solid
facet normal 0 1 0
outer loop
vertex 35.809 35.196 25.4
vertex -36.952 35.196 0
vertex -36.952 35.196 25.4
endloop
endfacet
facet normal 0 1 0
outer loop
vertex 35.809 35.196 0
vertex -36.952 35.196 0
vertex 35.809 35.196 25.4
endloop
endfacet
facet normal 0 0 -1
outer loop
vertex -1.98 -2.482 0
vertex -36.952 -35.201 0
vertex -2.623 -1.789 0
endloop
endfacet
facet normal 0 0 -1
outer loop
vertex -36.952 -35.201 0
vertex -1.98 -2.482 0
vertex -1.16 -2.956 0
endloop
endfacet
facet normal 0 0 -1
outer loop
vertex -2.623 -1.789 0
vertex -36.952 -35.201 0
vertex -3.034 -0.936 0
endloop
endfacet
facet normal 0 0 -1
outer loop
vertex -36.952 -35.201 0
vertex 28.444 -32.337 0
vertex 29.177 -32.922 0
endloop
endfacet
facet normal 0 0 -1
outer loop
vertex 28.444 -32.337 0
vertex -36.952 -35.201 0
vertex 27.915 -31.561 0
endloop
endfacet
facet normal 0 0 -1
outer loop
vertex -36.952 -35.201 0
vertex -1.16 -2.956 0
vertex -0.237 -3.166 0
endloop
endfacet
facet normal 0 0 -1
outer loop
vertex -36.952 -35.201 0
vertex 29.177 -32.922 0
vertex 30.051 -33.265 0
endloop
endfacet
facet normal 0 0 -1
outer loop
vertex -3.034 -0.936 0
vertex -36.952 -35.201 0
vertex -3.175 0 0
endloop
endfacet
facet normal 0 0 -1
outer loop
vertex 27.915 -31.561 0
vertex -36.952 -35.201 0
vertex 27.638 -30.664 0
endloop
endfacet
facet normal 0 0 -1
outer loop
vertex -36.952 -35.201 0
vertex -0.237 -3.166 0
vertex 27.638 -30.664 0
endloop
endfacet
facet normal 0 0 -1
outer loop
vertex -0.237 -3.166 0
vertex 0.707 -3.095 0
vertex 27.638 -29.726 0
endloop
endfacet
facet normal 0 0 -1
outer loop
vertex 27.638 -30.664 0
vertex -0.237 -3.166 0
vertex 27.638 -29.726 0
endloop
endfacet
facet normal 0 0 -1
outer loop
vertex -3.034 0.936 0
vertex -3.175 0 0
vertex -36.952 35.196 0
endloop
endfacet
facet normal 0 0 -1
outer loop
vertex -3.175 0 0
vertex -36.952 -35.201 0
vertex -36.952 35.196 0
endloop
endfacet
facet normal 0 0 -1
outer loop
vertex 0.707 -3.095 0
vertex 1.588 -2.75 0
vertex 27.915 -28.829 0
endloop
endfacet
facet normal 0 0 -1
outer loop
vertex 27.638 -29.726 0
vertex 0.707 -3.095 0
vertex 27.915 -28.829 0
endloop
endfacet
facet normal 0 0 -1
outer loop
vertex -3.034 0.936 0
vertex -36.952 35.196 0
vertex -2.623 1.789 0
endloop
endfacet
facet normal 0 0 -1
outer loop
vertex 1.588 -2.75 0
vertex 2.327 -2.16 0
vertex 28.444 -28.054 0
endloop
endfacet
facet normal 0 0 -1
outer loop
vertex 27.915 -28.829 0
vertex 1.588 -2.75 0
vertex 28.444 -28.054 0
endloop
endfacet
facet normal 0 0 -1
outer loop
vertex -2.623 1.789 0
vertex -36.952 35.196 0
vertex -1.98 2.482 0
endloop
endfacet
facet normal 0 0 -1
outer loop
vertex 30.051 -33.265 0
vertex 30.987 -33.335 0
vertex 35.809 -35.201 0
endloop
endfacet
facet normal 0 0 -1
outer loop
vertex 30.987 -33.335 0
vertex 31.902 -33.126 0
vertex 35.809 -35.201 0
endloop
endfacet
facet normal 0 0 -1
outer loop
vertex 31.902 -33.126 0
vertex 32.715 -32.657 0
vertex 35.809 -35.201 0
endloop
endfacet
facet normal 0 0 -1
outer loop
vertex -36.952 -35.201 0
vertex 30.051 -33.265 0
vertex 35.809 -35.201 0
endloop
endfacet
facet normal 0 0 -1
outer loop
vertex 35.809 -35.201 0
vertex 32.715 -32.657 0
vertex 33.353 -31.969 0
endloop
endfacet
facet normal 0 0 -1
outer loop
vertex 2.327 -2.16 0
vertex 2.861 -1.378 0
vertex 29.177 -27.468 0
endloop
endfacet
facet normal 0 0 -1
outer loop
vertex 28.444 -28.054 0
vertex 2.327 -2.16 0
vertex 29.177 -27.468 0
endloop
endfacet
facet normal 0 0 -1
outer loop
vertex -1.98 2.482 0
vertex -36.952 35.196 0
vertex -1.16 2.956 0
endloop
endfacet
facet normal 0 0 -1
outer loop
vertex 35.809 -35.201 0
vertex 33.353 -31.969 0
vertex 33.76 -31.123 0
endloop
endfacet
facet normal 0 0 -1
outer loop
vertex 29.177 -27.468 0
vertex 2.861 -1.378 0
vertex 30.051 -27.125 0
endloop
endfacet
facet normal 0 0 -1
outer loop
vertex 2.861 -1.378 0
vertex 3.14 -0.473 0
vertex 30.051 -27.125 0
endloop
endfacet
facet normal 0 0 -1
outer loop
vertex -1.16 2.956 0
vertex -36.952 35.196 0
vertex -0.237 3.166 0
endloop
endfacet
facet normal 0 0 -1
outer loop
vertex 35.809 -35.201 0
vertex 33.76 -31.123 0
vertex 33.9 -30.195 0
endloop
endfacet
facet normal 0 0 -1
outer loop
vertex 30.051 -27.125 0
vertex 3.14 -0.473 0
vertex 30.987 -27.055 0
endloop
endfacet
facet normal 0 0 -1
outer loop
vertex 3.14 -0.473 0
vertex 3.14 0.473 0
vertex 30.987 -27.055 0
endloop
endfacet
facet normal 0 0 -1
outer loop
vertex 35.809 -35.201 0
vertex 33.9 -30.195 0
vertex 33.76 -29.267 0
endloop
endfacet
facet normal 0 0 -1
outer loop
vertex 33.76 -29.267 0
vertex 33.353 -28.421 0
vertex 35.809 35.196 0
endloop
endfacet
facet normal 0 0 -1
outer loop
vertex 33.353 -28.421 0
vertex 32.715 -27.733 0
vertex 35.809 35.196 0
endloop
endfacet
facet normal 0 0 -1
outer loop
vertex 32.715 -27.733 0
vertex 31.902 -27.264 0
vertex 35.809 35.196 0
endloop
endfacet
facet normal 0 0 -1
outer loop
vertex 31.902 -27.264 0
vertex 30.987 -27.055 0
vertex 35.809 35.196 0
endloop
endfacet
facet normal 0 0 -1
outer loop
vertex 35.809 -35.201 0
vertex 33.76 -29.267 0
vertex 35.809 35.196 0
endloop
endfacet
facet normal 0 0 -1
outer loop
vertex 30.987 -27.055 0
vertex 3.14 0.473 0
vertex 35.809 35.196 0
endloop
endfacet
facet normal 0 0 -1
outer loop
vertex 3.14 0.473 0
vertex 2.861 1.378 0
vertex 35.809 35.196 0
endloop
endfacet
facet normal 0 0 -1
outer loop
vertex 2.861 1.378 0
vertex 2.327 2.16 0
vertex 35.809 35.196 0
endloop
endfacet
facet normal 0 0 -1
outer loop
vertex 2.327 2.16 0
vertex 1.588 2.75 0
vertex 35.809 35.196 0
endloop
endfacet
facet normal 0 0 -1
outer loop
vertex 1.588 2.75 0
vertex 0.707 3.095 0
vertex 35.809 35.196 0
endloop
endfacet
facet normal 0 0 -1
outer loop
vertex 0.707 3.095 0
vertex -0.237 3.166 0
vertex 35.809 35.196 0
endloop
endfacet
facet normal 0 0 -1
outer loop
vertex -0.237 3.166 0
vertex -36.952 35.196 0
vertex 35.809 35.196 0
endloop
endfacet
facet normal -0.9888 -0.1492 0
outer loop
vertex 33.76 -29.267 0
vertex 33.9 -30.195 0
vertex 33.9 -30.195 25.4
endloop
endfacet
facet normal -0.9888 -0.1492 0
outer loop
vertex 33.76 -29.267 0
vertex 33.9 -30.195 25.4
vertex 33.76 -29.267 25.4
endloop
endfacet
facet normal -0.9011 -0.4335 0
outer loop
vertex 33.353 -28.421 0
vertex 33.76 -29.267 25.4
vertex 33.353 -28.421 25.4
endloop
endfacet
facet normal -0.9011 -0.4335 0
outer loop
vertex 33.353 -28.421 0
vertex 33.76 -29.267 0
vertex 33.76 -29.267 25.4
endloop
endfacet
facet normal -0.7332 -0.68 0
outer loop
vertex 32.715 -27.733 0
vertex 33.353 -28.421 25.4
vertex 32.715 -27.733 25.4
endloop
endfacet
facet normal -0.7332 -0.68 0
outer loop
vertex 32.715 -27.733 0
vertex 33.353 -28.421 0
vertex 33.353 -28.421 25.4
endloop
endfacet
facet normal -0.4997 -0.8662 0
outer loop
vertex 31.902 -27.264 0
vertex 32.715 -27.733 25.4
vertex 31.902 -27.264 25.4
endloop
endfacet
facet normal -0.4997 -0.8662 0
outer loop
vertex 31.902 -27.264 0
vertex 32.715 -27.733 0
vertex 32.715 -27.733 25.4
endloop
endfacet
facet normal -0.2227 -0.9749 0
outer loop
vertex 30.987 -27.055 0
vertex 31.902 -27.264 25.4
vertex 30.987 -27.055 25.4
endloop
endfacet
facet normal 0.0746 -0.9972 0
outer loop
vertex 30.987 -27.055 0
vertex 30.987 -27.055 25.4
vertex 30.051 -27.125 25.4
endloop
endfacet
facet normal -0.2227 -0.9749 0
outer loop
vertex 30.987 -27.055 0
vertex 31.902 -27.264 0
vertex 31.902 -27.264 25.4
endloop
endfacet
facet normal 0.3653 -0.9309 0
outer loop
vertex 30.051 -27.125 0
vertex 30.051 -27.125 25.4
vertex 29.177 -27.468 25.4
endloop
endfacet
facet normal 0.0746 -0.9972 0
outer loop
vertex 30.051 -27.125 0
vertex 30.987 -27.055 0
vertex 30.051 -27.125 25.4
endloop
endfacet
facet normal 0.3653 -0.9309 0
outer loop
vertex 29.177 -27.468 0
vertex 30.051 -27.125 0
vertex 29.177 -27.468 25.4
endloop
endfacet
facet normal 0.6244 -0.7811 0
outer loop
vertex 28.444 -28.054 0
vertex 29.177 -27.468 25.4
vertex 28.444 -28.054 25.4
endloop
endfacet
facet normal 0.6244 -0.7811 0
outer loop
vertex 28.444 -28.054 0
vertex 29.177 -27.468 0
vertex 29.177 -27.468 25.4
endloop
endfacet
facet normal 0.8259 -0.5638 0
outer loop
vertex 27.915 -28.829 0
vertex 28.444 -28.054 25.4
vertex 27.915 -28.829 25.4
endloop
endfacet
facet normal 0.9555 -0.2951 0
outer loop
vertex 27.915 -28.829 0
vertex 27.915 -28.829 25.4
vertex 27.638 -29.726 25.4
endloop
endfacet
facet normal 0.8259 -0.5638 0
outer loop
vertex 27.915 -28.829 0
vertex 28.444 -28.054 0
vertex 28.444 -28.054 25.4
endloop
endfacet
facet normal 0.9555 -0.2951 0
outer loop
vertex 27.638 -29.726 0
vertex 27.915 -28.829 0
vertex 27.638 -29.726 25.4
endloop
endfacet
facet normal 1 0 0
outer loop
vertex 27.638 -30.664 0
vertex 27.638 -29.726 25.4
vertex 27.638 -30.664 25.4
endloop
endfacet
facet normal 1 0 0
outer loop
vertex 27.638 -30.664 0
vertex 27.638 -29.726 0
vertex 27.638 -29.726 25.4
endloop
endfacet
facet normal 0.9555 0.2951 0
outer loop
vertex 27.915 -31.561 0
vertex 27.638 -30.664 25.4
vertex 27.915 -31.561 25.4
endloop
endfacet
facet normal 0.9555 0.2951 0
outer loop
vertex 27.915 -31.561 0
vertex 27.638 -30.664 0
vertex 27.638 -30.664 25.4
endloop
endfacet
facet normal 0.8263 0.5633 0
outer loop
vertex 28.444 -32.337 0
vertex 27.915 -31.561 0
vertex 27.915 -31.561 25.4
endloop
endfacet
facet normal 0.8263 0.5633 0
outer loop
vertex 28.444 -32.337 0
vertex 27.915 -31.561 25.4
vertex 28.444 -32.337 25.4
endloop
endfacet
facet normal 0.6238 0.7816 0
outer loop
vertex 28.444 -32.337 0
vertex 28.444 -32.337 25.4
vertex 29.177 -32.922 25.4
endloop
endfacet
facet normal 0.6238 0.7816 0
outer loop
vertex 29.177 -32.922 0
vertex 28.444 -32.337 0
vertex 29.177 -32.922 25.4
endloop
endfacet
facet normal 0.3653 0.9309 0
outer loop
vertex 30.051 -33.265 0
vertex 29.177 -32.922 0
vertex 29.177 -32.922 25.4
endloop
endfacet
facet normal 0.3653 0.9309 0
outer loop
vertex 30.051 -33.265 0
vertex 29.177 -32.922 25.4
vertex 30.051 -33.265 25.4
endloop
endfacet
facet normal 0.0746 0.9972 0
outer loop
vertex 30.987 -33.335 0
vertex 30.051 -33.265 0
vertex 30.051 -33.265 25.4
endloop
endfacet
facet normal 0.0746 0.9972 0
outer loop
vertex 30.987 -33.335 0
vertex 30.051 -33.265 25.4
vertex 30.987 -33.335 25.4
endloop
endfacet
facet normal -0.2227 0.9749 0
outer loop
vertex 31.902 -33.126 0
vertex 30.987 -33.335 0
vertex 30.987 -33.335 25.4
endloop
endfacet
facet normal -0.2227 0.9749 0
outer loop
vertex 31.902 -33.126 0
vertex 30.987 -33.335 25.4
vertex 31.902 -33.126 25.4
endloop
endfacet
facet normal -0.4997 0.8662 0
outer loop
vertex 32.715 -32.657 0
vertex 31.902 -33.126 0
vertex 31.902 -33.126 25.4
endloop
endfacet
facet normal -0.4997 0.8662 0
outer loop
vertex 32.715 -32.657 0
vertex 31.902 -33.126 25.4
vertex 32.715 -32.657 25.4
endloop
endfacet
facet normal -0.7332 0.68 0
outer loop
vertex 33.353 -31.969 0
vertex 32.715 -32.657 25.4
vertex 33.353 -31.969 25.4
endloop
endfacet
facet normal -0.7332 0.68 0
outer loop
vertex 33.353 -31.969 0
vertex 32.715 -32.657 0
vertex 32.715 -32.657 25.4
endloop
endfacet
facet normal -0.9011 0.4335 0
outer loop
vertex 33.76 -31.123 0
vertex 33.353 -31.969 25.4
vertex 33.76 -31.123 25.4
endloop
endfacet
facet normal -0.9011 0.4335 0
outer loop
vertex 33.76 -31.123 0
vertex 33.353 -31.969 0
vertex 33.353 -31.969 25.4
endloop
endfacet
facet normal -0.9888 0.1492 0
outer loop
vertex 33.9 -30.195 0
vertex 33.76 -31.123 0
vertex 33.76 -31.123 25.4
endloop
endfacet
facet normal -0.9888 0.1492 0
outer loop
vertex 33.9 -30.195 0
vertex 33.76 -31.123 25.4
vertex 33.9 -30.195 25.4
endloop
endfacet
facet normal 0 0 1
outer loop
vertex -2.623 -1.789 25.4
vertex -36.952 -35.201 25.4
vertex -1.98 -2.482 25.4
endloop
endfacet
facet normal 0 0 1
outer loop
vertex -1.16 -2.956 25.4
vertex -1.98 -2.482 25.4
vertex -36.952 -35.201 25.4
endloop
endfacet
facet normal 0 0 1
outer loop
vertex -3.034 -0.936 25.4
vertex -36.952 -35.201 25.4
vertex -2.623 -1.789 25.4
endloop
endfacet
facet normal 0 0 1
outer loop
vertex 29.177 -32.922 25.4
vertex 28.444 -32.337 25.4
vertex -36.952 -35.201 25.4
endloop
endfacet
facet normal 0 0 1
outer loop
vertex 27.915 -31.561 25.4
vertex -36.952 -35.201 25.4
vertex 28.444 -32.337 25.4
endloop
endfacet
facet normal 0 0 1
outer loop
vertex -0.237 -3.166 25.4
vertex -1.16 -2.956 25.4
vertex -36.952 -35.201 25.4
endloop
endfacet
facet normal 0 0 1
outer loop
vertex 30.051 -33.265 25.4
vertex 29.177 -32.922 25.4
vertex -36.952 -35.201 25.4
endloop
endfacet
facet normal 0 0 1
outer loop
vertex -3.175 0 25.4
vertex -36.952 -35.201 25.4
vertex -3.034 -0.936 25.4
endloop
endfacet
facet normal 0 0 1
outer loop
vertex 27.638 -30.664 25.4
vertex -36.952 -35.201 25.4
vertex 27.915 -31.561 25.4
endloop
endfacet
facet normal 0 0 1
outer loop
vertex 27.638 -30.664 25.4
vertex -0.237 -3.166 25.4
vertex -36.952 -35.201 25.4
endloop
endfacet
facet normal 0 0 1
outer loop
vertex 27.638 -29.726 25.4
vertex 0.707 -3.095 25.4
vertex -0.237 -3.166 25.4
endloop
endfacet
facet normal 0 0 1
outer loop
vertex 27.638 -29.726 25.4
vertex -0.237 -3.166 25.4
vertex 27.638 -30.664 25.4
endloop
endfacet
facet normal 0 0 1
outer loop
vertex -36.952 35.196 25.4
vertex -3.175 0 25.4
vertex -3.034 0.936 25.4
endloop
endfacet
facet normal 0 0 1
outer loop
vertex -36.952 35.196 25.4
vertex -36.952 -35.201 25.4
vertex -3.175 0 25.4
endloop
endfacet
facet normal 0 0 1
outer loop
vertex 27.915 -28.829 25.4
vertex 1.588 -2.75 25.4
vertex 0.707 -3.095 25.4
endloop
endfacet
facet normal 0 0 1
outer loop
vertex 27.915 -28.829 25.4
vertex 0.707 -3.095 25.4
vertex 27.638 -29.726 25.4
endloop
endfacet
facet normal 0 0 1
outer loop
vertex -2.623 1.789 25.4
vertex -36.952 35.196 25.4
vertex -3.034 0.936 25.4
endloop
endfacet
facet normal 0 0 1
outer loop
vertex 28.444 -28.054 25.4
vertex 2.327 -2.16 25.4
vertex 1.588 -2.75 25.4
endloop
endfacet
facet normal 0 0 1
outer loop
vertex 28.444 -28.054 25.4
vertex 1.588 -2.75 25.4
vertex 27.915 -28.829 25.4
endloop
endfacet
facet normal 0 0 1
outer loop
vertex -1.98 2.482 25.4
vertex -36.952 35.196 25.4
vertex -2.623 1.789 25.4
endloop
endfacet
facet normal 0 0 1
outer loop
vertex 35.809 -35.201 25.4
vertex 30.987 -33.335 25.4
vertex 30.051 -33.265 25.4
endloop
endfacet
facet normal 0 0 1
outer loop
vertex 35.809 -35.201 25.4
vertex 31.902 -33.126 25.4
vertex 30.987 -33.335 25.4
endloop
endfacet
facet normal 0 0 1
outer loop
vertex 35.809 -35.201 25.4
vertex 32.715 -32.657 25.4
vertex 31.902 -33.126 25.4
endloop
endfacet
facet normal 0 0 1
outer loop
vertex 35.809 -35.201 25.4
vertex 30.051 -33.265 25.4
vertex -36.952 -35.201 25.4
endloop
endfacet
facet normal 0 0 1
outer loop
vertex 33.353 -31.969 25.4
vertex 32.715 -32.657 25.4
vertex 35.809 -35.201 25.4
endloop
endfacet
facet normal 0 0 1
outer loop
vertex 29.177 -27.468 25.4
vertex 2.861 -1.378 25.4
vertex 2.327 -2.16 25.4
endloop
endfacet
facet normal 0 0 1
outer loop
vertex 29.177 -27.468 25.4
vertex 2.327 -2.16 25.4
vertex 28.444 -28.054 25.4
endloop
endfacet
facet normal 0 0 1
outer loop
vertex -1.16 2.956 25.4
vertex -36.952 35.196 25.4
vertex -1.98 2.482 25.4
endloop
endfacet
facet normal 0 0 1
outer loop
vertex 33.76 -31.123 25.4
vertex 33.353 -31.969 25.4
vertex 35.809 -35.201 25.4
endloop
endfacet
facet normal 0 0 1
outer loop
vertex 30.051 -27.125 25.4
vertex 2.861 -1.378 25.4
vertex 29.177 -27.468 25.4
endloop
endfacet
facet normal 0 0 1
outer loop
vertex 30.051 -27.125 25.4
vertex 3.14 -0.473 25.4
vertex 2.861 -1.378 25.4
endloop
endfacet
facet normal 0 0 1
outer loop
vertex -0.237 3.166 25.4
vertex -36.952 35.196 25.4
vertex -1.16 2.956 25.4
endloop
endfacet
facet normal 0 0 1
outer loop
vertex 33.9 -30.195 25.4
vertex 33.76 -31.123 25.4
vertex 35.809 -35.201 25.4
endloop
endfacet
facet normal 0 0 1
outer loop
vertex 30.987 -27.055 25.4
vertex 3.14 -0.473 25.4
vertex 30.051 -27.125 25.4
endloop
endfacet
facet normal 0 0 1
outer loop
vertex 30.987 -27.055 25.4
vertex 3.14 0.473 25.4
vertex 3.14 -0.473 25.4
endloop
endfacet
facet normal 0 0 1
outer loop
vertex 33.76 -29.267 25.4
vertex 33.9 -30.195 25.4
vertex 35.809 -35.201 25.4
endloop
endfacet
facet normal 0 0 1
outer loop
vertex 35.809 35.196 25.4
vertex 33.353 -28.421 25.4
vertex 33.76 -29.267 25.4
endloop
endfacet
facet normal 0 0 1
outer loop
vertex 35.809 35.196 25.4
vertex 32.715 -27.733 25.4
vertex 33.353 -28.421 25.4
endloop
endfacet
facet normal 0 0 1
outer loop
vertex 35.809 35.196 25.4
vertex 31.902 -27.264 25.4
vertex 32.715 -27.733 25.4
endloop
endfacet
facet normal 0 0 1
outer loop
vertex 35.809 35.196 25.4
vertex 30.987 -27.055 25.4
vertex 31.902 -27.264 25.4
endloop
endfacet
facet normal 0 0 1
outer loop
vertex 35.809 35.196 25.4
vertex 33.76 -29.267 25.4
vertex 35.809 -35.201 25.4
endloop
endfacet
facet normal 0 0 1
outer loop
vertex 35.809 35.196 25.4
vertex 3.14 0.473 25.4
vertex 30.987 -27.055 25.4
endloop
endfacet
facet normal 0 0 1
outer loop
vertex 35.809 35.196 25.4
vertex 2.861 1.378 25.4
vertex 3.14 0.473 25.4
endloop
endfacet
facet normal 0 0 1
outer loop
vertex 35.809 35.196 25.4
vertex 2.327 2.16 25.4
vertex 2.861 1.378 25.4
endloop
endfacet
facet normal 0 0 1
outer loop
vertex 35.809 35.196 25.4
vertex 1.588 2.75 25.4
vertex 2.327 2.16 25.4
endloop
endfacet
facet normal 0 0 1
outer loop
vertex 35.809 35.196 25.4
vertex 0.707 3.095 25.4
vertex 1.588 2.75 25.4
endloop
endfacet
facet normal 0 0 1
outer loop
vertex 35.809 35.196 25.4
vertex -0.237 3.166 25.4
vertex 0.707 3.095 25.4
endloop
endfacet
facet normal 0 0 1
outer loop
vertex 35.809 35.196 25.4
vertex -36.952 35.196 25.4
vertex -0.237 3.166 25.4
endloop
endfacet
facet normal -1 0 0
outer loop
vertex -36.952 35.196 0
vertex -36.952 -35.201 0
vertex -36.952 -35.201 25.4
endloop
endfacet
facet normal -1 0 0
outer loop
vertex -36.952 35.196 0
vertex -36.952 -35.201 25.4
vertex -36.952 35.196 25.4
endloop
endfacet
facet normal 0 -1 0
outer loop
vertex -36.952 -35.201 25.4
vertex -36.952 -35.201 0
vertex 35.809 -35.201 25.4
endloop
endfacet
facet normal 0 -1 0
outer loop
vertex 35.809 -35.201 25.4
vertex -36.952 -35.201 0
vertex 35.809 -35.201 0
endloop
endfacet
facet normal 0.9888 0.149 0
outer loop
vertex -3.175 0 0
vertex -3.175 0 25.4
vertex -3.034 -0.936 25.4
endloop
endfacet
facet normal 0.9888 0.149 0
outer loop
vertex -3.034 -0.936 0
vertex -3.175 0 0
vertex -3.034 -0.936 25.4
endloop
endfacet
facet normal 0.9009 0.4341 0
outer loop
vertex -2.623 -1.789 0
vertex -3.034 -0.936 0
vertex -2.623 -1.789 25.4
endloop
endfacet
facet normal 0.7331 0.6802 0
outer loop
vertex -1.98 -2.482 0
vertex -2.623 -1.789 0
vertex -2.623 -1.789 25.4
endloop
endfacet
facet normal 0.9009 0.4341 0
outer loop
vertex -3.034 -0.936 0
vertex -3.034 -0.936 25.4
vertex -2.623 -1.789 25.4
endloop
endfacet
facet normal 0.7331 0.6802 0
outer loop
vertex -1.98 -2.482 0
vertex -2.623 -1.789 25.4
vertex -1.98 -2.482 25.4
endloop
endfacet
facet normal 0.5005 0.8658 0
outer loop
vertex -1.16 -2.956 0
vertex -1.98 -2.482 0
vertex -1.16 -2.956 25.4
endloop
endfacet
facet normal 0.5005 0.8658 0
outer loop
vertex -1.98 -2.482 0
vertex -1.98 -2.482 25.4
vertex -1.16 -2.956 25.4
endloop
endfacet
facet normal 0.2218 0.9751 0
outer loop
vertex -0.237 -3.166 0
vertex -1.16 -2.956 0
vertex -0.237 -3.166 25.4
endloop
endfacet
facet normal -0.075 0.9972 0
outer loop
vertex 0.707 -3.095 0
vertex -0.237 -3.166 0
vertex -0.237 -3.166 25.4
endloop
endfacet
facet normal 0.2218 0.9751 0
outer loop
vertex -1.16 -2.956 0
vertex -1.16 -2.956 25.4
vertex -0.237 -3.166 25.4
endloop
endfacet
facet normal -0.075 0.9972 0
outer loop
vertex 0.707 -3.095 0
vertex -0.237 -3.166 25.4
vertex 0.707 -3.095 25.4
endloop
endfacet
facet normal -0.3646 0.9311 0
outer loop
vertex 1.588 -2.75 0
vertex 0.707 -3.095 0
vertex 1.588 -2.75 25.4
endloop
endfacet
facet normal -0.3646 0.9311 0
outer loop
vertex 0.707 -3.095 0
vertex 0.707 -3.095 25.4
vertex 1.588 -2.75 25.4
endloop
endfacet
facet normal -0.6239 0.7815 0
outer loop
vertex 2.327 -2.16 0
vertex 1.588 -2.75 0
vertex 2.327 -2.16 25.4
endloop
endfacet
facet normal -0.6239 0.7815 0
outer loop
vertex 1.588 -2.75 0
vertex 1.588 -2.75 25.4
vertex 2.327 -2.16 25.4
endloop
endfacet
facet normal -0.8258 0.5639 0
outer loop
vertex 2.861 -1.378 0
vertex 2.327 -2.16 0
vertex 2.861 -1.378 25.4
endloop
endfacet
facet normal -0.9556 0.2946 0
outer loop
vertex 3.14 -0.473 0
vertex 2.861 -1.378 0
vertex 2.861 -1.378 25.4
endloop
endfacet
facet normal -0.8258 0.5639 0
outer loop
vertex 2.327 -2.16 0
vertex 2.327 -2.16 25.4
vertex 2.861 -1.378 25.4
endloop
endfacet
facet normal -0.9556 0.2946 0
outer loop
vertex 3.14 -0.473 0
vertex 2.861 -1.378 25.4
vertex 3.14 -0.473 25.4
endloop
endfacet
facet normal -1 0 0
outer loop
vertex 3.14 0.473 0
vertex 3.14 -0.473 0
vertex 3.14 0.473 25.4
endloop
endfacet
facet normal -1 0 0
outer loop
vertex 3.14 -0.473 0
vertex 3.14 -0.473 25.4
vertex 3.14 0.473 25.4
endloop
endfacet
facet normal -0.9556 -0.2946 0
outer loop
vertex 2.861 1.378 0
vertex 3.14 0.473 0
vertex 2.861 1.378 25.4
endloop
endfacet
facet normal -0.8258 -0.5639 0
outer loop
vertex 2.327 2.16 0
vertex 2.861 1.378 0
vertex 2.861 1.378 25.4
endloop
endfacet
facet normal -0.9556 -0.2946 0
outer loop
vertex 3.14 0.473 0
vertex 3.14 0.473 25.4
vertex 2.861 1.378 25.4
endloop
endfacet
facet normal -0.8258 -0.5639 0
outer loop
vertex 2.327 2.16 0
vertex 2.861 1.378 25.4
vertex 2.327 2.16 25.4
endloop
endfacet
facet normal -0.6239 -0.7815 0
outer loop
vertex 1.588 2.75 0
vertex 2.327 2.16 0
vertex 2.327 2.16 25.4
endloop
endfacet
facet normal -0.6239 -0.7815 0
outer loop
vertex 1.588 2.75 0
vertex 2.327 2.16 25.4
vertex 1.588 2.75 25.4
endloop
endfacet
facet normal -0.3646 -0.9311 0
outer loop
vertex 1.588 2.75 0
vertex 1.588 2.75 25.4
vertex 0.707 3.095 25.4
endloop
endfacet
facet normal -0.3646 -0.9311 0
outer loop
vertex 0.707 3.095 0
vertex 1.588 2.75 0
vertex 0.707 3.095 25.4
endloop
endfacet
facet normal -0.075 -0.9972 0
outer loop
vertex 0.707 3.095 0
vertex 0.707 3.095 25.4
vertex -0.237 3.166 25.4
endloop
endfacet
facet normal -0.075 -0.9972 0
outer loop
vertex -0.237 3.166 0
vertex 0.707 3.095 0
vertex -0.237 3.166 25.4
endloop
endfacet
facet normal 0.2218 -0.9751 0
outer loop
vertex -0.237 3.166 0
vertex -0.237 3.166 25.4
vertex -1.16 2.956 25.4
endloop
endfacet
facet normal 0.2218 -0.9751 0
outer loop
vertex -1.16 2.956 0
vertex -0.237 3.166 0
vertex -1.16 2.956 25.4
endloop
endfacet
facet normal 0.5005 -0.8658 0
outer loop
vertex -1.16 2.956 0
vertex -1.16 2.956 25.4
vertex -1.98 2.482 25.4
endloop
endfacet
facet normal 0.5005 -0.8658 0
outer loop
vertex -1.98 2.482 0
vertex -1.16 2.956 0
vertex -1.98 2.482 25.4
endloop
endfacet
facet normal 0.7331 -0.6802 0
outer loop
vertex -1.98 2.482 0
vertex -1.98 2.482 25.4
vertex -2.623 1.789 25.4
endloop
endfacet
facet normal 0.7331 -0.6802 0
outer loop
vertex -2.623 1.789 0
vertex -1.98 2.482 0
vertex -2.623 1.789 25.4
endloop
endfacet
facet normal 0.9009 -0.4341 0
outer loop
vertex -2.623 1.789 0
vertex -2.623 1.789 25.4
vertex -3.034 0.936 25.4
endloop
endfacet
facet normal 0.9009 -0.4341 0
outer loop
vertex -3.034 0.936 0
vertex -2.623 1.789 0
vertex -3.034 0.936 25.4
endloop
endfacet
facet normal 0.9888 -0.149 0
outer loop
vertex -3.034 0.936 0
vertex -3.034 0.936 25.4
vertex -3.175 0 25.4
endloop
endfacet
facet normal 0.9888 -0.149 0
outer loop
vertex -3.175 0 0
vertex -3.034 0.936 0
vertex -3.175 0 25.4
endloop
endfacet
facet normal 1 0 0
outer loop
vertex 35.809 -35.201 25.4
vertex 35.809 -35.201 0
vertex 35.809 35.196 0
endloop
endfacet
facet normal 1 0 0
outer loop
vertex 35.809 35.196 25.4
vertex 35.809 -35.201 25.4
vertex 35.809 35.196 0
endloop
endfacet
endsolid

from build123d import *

# Parameters (mm, degrees)
F0_W     = 72.761286
F0_H     = 70.397198
F1_DEPTH = 25.4
F2_R     = 3.148558
F3_DEPTH = 25.4
F6_D     = 6.35


with BuildPart() as f1:
    # F0 (on Top) → F1 (new body)
    with BuildSketch(Plane.XY):
        with Locations((-0.571629, -0.002768)):
            Rectangle(F0_W, F0_H)
    extrude(amount=F1_DEPTH)


with BuildPart() as f3:
    # F2 (on Top) → F3 (new body)
    with BuildSketch(Plane.XY):
        with Locations((30.75167, -30.19508)):
            Circle(F2_R)
    extrude(amount=F3_DEPTH)


with BuildPart() as f1_1:
    add(f1.part)

    # F4: cut F3
    add(f3.part, mode=Mode.SUBTRACT)

    # F6 (through all)
    with Locations(Plane(origin=(0, 0, 0), x_dir=(1, 0, 0), z_dir=(0, 0, -1))):
        with Locations((0, 0)):
            Hole(F6_D / 2)


solid = f1_1.part
